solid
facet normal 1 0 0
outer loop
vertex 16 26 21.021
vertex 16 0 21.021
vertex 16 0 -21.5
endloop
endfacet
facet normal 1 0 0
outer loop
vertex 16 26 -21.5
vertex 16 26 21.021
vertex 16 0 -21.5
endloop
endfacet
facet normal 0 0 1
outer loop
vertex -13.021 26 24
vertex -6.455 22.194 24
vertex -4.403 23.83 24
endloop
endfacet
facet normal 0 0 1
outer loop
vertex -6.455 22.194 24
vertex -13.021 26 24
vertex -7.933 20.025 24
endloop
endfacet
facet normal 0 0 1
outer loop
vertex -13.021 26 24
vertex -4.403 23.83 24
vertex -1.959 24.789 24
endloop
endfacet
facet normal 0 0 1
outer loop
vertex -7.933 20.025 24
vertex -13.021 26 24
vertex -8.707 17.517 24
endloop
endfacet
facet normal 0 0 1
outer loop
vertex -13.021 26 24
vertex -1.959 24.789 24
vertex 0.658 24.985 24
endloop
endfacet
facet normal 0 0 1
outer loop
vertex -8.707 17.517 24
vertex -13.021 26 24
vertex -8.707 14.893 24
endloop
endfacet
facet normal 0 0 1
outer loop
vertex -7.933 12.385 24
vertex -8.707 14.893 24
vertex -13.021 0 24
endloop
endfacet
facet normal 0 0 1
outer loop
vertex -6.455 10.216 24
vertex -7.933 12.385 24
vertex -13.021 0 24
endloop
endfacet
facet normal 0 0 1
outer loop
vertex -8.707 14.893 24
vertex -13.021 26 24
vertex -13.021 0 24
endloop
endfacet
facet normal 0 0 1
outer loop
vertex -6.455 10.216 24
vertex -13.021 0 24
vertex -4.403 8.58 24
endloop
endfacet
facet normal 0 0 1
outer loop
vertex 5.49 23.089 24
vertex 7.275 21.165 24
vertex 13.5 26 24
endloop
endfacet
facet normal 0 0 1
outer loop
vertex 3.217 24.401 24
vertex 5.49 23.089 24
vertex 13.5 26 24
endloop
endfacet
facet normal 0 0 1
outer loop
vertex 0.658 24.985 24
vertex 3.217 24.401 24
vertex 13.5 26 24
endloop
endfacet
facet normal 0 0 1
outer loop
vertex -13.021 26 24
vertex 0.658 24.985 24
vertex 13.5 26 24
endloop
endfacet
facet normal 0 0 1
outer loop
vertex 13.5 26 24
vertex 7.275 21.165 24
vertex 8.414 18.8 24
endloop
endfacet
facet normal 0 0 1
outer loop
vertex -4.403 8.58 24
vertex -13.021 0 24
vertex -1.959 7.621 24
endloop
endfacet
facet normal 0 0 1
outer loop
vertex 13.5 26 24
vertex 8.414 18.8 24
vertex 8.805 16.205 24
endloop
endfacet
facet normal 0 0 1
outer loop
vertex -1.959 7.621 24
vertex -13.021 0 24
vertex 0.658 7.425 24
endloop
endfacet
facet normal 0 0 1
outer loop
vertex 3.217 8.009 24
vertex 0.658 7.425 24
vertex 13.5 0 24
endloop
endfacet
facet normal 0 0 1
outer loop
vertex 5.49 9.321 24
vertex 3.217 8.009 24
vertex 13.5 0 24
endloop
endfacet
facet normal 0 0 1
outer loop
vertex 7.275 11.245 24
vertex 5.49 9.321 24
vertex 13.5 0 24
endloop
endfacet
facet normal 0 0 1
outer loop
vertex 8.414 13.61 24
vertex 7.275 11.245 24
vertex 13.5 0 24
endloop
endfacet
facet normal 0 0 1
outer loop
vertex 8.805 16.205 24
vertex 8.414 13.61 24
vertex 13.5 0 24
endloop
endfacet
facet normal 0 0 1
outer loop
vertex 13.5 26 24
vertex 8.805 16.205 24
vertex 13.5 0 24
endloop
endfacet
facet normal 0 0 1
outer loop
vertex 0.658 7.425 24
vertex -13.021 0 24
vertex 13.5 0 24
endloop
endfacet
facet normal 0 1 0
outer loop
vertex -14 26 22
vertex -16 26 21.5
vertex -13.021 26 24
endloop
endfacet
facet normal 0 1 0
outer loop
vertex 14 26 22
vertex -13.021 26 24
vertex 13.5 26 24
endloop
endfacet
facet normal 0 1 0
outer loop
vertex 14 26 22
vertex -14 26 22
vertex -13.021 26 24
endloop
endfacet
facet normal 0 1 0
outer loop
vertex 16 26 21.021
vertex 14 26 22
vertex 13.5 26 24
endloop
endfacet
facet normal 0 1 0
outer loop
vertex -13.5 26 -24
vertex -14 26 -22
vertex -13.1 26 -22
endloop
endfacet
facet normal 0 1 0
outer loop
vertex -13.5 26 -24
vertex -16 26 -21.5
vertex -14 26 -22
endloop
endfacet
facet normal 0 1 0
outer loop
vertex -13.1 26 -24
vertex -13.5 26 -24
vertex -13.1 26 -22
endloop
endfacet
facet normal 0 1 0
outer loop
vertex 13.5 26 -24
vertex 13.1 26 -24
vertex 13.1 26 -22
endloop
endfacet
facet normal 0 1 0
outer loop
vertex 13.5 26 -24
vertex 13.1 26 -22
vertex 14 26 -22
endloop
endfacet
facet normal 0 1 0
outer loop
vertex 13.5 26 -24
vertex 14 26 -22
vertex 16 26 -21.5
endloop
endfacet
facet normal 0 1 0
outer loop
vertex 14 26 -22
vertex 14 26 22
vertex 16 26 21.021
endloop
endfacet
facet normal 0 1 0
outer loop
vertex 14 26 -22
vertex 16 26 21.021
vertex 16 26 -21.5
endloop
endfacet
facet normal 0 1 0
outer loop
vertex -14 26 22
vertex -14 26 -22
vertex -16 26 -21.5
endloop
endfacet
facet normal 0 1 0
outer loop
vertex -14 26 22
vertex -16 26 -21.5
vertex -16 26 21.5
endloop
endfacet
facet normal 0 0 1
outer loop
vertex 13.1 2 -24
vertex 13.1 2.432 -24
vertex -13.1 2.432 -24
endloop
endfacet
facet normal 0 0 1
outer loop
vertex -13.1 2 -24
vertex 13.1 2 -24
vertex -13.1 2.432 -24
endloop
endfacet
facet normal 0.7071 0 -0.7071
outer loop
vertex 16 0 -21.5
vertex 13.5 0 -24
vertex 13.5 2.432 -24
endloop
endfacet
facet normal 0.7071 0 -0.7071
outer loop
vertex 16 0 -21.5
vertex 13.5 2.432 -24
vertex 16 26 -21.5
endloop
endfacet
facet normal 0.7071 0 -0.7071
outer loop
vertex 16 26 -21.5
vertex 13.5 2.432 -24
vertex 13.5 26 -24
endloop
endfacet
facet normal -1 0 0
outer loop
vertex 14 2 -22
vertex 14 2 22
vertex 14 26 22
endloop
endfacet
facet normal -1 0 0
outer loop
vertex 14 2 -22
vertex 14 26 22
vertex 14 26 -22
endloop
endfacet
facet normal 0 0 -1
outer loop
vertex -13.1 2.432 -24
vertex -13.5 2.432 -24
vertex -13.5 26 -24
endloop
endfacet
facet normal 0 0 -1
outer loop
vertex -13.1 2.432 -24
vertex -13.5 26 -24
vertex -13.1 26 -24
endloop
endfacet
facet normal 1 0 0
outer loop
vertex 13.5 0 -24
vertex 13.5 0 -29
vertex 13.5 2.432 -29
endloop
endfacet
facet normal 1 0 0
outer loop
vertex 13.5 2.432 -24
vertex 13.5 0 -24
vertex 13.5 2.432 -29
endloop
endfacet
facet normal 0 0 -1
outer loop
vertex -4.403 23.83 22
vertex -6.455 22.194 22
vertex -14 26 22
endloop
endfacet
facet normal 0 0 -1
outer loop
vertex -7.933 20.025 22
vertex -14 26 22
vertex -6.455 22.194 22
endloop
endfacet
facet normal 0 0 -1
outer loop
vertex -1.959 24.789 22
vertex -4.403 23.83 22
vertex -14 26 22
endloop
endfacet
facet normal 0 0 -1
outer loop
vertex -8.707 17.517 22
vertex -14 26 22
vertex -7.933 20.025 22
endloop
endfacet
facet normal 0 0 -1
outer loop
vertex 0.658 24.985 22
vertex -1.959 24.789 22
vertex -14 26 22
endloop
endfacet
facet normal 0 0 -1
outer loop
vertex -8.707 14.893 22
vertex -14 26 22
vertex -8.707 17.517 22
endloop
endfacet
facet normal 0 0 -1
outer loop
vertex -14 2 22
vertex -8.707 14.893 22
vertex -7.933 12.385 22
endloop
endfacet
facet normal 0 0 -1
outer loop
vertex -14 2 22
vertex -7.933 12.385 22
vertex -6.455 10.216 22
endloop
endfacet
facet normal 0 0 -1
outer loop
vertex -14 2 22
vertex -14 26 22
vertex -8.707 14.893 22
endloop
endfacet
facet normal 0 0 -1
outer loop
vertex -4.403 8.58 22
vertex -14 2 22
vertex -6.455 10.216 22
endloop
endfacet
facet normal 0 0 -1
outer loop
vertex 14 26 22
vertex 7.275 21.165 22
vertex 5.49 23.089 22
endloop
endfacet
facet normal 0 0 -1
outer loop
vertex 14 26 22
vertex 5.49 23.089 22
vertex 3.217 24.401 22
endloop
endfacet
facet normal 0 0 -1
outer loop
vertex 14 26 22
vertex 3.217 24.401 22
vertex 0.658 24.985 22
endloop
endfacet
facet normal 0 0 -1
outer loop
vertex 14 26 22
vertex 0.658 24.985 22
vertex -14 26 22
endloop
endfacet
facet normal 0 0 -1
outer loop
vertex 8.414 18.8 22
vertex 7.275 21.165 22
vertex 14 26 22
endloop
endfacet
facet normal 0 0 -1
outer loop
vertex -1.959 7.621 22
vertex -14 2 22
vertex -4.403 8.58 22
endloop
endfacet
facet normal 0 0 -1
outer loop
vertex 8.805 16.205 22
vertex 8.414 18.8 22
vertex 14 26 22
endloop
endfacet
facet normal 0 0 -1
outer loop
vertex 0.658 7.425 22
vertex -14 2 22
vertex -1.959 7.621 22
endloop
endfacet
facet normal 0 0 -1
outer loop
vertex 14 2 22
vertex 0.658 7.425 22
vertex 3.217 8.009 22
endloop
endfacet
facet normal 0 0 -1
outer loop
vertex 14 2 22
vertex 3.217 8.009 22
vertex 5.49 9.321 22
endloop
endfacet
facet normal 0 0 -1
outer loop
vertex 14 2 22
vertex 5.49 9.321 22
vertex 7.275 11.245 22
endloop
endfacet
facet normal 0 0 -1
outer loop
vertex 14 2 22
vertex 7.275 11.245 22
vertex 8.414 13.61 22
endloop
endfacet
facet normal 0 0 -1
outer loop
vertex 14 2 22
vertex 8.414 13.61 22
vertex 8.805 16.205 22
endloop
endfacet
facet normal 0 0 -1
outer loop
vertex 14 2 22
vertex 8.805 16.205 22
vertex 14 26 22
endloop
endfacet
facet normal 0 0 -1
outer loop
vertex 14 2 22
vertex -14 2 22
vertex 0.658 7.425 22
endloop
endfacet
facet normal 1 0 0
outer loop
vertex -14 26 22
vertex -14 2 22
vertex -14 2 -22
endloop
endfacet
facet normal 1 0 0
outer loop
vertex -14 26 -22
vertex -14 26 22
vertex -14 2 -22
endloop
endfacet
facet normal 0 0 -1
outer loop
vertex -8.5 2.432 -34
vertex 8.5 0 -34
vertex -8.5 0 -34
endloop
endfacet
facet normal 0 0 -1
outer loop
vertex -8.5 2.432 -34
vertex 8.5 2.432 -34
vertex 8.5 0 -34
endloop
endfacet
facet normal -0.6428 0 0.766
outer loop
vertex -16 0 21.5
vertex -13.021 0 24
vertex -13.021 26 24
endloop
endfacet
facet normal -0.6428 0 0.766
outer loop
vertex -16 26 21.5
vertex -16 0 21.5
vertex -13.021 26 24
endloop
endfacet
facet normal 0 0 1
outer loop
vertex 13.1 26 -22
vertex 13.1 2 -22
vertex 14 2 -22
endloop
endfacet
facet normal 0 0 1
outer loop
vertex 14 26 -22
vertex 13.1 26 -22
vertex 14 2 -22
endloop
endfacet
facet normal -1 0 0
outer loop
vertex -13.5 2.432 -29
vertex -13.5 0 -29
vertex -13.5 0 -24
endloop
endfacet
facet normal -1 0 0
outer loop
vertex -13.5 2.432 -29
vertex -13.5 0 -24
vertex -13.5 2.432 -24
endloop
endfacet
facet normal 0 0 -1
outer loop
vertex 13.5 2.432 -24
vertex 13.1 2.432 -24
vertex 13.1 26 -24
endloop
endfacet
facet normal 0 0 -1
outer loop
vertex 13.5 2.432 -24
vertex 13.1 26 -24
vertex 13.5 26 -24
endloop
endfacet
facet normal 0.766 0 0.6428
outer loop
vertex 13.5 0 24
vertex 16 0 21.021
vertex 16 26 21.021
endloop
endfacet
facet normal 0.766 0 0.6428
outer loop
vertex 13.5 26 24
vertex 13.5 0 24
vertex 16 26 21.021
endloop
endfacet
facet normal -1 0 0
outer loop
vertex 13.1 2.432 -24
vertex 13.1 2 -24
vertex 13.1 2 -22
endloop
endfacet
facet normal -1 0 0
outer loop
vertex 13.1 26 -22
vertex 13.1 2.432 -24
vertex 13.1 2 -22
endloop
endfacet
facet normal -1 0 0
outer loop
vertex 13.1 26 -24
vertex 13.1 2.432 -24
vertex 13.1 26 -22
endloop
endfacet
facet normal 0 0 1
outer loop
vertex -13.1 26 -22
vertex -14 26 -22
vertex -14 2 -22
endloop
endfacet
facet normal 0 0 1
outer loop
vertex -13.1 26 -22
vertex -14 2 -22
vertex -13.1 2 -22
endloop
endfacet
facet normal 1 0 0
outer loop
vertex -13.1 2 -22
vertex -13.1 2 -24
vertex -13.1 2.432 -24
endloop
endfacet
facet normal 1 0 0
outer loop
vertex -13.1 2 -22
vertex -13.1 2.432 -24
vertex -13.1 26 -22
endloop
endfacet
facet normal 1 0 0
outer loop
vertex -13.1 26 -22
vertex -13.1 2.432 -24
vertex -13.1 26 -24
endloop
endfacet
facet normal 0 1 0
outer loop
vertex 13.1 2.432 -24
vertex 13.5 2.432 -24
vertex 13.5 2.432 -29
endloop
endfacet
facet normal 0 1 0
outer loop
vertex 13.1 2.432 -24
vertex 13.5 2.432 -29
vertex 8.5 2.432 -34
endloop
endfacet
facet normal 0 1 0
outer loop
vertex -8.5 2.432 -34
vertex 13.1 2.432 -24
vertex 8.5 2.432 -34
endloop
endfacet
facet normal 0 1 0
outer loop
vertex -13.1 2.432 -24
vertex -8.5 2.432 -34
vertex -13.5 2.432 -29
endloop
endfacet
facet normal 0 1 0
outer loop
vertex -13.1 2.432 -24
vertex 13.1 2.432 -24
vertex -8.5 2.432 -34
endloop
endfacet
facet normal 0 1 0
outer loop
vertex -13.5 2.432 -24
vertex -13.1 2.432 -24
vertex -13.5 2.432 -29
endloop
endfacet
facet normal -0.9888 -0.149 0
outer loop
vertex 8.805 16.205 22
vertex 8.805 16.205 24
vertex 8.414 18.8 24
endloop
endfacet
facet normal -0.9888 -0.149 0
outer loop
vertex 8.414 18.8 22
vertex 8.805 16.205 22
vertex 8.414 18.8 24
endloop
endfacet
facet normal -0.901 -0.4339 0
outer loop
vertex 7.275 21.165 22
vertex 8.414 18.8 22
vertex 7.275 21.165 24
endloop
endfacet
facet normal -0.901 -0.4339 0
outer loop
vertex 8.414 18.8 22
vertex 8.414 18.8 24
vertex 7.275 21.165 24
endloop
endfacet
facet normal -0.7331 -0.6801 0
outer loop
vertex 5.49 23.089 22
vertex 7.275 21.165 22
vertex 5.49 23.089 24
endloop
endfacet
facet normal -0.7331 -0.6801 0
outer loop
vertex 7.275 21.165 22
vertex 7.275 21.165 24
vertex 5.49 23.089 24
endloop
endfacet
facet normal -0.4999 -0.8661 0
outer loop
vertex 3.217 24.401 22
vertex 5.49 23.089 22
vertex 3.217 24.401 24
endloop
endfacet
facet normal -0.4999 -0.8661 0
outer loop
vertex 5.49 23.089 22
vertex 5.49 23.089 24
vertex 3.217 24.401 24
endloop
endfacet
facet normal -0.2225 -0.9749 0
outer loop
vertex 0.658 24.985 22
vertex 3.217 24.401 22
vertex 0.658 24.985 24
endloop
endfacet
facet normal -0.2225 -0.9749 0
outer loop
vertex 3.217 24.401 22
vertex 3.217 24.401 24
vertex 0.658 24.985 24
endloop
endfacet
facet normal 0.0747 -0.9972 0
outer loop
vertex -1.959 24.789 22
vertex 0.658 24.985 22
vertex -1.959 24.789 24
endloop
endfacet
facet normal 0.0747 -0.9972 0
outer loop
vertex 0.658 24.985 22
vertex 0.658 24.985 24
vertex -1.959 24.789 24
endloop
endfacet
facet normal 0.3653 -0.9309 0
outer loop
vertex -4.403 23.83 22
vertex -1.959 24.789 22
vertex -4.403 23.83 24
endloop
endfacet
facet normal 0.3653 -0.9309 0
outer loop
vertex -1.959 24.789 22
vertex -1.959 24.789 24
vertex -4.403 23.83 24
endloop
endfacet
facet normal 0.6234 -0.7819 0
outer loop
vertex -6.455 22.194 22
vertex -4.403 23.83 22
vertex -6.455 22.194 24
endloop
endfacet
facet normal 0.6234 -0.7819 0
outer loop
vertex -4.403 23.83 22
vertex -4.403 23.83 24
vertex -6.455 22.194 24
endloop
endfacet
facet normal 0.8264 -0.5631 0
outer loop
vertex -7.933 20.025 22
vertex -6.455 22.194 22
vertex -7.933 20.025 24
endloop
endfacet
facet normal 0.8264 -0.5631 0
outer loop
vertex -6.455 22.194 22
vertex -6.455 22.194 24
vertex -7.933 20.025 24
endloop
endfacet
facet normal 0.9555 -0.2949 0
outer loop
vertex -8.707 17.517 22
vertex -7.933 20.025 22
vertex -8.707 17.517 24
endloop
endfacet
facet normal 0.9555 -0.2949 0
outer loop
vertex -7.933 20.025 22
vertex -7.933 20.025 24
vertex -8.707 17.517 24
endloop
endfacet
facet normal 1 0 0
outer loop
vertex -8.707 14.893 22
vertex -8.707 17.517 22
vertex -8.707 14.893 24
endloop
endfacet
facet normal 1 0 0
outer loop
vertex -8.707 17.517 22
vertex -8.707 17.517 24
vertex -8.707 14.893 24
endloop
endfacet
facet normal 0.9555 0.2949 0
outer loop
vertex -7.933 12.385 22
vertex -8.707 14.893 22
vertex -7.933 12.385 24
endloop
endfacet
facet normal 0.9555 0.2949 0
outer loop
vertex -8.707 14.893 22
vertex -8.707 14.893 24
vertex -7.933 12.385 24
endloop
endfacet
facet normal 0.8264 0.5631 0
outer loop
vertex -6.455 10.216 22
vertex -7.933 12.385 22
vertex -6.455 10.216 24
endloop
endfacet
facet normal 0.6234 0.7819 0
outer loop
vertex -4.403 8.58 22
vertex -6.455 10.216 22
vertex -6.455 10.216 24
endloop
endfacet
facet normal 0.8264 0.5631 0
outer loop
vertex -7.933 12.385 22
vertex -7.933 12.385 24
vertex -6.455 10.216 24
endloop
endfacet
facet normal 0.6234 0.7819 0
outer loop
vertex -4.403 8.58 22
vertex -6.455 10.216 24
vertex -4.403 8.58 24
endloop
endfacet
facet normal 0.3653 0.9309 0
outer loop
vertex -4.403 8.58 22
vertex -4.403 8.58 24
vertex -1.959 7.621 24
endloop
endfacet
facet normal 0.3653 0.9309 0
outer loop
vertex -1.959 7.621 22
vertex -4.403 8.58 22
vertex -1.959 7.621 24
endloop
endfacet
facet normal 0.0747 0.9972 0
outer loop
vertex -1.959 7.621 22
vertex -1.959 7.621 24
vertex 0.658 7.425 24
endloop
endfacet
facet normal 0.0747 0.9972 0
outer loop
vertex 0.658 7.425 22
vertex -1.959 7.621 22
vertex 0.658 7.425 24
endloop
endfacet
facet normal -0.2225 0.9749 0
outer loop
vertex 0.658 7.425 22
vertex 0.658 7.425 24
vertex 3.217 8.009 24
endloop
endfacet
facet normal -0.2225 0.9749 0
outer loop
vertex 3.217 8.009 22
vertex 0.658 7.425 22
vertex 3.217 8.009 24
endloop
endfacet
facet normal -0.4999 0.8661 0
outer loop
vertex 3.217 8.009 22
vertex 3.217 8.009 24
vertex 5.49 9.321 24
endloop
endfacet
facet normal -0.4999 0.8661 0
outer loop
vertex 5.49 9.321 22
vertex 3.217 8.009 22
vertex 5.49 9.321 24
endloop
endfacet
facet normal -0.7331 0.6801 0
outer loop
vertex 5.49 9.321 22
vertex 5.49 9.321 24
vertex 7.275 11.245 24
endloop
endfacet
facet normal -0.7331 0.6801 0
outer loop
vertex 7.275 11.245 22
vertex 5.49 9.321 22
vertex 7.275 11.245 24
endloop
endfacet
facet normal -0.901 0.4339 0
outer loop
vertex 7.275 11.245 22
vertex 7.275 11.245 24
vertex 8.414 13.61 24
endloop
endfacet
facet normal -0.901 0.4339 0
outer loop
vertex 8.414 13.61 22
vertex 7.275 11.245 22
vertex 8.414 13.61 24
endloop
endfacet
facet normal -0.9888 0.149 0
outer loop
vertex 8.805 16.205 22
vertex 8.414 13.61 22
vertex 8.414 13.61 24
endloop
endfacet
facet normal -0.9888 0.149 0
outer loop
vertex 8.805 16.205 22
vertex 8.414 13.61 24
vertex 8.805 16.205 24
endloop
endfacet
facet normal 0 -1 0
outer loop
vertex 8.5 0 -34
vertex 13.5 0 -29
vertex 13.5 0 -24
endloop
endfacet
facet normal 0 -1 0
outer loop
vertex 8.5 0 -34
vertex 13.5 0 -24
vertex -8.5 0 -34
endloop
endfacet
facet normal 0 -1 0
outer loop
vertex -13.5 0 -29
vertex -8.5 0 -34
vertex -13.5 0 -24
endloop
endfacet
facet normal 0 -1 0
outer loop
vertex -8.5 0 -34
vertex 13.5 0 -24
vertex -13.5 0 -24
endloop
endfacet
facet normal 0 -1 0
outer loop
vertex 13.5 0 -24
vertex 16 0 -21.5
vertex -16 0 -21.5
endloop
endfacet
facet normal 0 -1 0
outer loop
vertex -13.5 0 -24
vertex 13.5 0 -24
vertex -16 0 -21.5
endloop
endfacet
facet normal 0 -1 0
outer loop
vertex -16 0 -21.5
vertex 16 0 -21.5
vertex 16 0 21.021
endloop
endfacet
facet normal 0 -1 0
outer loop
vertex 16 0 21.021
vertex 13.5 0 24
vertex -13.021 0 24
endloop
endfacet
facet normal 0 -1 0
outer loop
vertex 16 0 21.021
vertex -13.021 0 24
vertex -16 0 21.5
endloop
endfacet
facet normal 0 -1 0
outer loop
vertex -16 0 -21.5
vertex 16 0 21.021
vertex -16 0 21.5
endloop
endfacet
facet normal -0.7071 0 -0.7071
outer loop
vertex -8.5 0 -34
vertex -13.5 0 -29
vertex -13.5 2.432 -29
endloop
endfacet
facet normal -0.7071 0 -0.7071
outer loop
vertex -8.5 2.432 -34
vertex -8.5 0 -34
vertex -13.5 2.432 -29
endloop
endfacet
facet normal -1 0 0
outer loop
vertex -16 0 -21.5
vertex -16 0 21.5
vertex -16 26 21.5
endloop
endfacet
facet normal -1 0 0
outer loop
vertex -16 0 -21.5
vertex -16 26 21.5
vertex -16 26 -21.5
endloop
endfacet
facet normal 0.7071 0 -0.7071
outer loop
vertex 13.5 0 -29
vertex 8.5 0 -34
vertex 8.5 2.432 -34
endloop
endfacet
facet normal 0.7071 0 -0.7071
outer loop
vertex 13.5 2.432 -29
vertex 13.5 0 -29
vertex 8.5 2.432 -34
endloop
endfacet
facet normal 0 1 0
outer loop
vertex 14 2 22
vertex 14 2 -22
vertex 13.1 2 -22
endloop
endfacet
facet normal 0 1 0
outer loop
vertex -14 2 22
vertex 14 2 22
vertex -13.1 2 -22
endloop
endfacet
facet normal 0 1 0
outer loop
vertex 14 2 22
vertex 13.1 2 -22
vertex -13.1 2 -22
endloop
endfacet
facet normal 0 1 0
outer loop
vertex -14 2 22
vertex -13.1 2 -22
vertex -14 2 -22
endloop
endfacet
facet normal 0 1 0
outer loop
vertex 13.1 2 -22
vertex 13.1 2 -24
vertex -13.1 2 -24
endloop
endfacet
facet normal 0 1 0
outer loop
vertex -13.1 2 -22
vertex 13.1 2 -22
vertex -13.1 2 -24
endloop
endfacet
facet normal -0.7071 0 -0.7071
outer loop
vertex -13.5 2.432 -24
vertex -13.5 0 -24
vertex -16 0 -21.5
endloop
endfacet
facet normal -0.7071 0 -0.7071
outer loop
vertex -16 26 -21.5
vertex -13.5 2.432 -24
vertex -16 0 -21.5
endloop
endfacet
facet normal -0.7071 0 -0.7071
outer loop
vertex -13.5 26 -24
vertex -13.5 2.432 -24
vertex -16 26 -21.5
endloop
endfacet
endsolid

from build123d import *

# Parameters (mm, degrees)
SKETCH1_W             = 32
SKETCH1_H             = 48
BOSS_EXTRUDE1_DEPTH   = 26
SHELL1_T              = -2
SKETCH2_W             = 26.2
SKETCH2_H             = 24
CUT_EXTRUDE1_DEPTH    = 20
CHAMFER1_SIZE         = 2.5
CHAMFER1_SIZE2        = 2.979383981
CHAMFER1_PART_2_SIZE  = 2.5
CHAMFER1_PART_2_SIZE2 = 2.979383981
CHAMFER3_SIZE         = 2.5
SKETCH5_W             = 27
SKETCH5_H             = 2.432389293
BOSS_EXTRUDE3_DEPTH   = 10
CHAMFER4_SIZE         = 5
SKETCH6_R             = 8.805
CUT_EXTRUDE3_DEPTH    = 10


with BuildPart() as part:
    # Sketch1 → Boss-Extrude1 (new body)
    with BuildSketch(Plane(origin=(0, 0, 0), x_dir=(1, 0, 0), z_dir=(0, 1, 0))):
        Rectangle(SKETCH1_W, SKETCH1_H)
    extrude(amount=BOSS_EXTRUDE1_DEPTH)

    # Shell1
    shell1_openings = [part.faces().sort_by_distance(p)[0] for p in [
        (0, 26, 0),
    ]]
    offset(amount=SHELL1_T, openings=shell1_openings, kind=Kind.INTERSECTION)

    # Sketch2 → Cut-Extrude1 (cut)
    with BuildSketch(Plane(origin=(0, 0, -24), x_dir=(-1, 0, 0), z_dir=(0, 0, -1))):
        with Locations((0, 14)):
            Rectangle(SKETCH2_W, SKETCH2_H)
    extrude(amount=-CUT_EXTRUDE1_DEPTH, mode=Mode.SUBTRACT)

    # Chamfer1
    chamfer1_edges = [part.edges().sort_by_distance(p)[0] for p in [
        (16, 13, 24),
    ]]
    chamfer1_side = [part.faces().sort_by_distance(p)[0] for p in [
        (0, 13, 24),
    ]]
    chamfer(chamfer1_edges, length=CHAMFER1_SIZE, length2=CHAMFER1_SIZE2, reference=chamfer1_side[0])

    # Chamfer1 part 2
    chamfer1_part_2_edges = [part.edges().sort_by_distance(p)[0] for p in [
        (-16, 13, 24),
    ]]
    chamfer1_part_2_side = [part.faces().sort_by_distance(p)[0] for p in [
        (-16, 13, 0),
    ]]
    chamfer(chamfer1_part_2_edges, length=CHAMFER1_PART_2_SIZE, length2=CHAMFER1_PART_2_SIZE2, reference=chamfer1_part_2_side[0])

    # Chamfer3
    chamfer3_edges = [part.edges().sort_by_distance(p)[0] for p in [
        (-16, 13, -24),
        (16, 13, -24),
    ]]
    chamfer(chamfer3_edges, length=CHAMFER3_SIZE)

    # Sketch5 → Boss-Extrude3 (add)
    with BuildSketch(Plane(origin=(0, 0, -24), x_dir=(-1, 0, 0), z_dir=(0, 0, -1))):
        with Locations((0, 1.216194646)):
            Rectangle(SKETCH5_W, SKETCH5_H)
    extrude(amount=BOSS_EXTRUDE3_DEPTH)

    # Chamfer4
    chamfer4_edges = [part.edges().sort_by_distance(p)[0] for p in [
        (13.5, 1.216194647, -34),
        (-13.5, 1.216194647, -34),
    ]]
    chamfer(chamfer4_edges, length=CHAMFER4_SIZE)

    # Sketch6 → Cut-Extrude3 (cut)
    with BuildSketch(Plane.XY.offset(24)):
        with Locations((0, 16.205)):
            Circle(SKETCH6_R)
    extrude(amount=-CUT_EXTRUDE3_DEPTH, mode=Mode.SUBTRACT)


solid = part.part
